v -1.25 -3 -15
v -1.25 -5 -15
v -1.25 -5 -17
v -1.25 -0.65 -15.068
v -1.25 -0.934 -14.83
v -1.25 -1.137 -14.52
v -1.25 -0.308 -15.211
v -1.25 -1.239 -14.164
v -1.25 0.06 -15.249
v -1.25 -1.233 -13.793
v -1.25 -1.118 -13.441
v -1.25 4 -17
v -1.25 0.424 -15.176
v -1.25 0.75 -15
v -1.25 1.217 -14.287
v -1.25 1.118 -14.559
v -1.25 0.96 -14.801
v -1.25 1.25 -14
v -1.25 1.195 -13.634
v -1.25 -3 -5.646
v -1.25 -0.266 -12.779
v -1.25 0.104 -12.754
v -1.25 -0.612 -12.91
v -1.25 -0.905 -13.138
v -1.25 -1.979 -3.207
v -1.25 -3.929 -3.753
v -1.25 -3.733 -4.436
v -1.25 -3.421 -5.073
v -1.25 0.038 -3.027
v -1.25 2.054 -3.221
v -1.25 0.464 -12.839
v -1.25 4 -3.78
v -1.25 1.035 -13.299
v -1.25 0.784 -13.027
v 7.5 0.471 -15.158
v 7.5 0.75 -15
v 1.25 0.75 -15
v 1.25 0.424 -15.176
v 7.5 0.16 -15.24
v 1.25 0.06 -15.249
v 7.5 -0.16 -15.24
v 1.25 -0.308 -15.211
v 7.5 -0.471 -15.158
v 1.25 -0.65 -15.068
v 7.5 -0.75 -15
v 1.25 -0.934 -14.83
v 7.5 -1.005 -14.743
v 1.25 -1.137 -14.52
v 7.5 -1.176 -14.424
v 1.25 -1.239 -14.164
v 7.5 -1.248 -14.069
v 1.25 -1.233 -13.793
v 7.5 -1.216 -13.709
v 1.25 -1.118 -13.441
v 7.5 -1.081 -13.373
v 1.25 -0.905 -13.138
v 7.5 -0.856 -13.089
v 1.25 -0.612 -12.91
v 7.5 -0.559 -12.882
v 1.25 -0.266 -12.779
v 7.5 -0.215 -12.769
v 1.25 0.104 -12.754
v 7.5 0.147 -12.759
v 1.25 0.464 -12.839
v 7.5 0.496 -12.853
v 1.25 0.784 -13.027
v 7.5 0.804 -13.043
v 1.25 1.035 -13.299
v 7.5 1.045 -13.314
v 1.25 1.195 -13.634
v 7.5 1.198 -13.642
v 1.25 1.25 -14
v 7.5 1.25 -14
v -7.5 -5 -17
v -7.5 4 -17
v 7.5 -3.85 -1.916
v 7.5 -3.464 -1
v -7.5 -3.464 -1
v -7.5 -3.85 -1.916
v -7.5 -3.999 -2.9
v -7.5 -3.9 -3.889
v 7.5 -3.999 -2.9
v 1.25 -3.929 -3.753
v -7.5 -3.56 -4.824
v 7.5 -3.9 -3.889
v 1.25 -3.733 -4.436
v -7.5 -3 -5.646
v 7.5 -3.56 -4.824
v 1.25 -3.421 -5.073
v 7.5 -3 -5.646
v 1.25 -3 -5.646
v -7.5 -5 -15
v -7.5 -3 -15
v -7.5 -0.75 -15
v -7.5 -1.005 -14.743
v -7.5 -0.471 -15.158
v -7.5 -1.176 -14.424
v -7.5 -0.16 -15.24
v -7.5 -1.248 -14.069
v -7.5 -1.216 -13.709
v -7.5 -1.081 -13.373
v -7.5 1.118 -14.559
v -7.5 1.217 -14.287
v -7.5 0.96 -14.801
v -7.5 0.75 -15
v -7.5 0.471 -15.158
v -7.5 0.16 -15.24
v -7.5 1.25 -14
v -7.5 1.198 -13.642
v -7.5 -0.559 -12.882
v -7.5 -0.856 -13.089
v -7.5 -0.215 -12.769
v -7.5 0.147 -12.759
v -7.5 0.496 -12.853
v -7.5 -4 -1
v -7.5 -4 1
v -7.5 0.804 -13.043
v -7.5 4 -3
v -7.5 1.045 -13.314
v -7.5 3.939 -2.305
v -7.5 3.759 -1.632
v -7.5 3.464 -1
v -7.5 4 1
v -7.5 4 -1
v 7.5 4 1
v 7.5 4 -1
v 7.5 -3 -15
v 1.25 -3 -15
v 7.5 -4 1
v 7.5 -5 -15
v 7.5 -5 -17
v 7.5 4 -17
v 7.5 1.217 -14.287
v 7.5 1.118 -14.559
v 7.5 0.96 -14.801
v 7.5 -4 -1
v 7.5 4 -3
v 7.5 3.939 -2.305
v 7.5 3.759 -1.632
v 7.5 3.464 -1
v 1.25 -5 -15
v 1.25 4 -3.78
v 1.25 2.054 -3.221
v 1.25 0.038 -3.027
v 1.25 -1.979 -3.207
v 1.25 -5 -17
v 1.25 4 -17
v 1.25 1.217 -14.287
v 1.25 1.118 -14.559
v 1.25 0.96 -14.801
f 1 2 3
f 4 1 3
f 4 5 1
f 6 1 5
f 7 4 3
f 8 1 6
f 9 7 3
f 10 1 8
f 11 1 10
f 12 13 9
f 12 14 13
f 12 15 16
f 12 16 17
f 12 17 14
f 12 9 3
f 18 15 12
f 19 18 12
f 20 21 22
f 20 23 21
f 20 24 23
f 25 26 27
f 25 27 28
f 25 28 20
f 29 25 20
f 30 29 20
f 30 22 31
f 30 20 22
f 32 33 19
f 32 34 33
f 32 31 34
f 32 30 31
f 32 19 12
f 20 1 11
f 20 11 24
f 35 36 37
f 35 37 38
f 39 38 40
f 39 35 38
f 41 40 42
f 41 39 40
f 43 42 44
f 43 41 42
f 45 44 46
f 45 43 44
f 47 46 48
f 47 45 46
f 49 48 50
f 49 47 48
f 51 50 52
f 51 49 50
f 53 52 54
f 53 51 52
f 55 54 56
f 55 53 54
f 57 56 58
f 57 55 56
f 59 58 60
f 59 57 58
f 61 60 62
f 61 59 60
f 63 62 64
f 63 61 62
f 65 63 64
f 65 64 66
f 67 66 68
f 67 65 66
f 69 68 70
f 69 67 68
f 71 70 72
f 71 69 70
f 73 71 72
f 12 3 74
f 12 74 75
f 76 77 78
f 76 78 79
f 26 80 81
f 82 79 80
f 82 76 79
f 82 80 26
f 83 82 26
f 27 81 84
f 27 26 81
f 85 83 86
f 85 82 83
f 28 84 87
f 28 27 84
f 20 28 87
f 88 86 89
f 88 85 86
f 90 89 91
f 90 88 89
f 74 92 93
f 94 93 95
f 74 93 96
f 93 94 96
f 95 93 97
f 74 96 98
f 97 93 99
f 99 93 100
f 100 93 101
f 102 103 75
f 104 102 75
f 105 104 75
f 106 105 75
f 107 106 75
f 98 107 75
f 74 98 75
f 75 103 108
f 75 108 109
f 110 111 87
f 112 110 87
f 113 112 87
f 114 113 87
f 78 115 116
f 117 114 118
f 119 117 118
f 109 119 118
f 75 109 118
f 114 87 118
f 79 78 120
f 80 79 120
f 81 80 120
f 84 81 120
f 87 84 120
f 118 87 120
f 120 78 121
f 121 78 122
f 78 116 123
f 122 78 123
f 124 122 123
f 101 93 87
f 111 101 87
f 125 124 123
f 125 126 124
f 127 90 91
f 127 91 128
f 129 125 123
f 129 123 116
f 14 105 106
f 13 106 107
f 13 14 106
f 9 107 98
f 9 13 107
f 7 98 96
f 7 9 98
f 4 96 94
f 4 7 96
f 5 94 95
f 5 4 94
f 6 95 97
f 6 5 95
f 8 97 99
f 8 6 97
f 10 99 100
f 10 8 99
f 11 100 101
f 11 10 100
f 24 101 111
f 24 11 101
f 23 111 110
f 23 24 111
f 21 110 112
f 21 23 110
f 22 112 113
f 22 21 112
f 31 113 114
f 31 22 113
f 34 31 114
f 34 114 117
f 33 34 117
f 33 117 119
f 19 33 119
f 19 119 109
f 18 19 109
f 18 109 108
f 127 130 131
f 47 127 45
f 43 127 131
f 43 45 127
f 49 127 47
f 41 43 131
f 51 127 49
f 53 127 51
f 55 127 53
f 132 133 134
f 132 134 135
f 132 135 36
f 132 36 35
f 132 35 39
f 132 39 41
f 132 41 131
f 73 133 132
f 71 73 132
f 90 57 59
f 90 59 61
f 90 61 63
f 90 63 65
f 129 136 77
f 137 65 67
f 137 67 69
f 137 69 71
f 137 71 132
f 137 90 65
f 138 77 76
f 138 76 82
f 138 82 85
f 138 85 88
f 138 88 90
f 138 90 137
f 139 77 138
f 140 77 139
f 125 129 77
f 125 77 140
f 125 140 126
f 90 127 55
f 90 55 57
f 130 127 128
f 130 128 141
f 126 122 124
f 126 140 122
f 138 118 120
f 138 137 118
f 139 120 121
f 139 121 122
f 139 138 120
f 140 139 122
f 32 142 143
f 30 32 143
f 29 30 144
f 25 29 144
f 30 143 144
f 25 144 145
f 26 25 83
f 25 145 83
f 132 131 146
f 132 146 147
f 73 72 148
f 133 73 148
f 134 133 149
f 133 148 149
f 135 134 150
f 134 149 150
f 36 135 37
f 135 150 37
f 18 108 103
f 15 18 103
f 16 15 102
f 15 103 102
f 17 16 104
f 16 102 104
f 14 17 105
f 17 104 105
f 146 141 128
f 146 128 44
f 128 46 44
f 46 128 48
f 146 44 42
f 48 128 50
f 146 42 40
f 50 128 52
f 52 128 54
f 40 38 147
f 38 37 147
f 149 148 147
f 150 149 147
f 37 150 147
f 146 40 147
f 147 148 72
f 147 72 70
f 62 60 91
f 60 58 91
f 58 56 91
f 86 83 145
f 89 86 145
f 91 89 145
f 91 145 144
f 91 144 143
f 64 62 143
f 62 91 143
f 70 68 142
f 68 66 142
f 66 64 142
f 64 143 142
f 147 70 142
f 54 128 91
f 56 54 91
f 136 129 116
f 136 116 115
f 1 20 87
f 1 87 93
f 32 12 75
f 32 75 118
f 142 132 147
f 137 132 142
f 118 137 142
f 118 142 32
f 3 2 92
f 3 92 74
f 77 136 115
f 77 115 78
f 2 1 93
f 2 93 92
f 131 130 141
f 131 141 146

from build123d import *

# Parameters (mm, degrees)
F1_DEPTH = 7.5
F2_R     = 11
F3_DEPTH = 1.25


with BuildPart() as f1:
    # F0 (on Right) → F1 (new body, symmetric)
    with BuildSketch(Plane.YZ):
        with BuildLine():
            Line((4, -1), (4, 1))
            Line((4, 1), (-4, 1))
            Line((-4, 1), (-4, -1))
            Line((-4, -1), (-3.464102, -1))
            ThreePointArc((-3.464102, -1), (-3.980189, -3.397613), (-3, -5.645751))
            Line((-3, -5.645751), (-3, -15))
            Line((-3, -15), (-5, -15))
            Line((-5, -15), (-5, -17))
            Line((-5, -17), (4, -17))
            Line((4, -17), (4, -15))
            Line((4, -15), (4, -3))
            ThreePointArc((4, -3), (3.863703, -1.964724), (3.464102, -1))
            Line((3.464102, -1), (4, -1))
        make_face()
        with BuildLine():
            ThreePointArc((1.25, -14), (1.118034, -14.559017), (0.75, -15))
            ThreePointArc((0.75, -15), (0, -15.25), (-0.75, -15))
            ThreePointArc((-0.75, -15), (-0.559017, -12.881966), (1.25, -14))
        make_face(mode=Mode.SUBTRACT)
    extrude(amount=F1_DEPTH, both=True)

    # F2 (on Right) → F3 (cut, symmetric)
    with BuildSketch(Plane.YZ):
        with Locations((0, -14.027427)):
            Circle(F2_R)
    extrude(amount=F3_DEPTH, both=True, mode=Mode.SUBTRACT)


solid = f1.part
